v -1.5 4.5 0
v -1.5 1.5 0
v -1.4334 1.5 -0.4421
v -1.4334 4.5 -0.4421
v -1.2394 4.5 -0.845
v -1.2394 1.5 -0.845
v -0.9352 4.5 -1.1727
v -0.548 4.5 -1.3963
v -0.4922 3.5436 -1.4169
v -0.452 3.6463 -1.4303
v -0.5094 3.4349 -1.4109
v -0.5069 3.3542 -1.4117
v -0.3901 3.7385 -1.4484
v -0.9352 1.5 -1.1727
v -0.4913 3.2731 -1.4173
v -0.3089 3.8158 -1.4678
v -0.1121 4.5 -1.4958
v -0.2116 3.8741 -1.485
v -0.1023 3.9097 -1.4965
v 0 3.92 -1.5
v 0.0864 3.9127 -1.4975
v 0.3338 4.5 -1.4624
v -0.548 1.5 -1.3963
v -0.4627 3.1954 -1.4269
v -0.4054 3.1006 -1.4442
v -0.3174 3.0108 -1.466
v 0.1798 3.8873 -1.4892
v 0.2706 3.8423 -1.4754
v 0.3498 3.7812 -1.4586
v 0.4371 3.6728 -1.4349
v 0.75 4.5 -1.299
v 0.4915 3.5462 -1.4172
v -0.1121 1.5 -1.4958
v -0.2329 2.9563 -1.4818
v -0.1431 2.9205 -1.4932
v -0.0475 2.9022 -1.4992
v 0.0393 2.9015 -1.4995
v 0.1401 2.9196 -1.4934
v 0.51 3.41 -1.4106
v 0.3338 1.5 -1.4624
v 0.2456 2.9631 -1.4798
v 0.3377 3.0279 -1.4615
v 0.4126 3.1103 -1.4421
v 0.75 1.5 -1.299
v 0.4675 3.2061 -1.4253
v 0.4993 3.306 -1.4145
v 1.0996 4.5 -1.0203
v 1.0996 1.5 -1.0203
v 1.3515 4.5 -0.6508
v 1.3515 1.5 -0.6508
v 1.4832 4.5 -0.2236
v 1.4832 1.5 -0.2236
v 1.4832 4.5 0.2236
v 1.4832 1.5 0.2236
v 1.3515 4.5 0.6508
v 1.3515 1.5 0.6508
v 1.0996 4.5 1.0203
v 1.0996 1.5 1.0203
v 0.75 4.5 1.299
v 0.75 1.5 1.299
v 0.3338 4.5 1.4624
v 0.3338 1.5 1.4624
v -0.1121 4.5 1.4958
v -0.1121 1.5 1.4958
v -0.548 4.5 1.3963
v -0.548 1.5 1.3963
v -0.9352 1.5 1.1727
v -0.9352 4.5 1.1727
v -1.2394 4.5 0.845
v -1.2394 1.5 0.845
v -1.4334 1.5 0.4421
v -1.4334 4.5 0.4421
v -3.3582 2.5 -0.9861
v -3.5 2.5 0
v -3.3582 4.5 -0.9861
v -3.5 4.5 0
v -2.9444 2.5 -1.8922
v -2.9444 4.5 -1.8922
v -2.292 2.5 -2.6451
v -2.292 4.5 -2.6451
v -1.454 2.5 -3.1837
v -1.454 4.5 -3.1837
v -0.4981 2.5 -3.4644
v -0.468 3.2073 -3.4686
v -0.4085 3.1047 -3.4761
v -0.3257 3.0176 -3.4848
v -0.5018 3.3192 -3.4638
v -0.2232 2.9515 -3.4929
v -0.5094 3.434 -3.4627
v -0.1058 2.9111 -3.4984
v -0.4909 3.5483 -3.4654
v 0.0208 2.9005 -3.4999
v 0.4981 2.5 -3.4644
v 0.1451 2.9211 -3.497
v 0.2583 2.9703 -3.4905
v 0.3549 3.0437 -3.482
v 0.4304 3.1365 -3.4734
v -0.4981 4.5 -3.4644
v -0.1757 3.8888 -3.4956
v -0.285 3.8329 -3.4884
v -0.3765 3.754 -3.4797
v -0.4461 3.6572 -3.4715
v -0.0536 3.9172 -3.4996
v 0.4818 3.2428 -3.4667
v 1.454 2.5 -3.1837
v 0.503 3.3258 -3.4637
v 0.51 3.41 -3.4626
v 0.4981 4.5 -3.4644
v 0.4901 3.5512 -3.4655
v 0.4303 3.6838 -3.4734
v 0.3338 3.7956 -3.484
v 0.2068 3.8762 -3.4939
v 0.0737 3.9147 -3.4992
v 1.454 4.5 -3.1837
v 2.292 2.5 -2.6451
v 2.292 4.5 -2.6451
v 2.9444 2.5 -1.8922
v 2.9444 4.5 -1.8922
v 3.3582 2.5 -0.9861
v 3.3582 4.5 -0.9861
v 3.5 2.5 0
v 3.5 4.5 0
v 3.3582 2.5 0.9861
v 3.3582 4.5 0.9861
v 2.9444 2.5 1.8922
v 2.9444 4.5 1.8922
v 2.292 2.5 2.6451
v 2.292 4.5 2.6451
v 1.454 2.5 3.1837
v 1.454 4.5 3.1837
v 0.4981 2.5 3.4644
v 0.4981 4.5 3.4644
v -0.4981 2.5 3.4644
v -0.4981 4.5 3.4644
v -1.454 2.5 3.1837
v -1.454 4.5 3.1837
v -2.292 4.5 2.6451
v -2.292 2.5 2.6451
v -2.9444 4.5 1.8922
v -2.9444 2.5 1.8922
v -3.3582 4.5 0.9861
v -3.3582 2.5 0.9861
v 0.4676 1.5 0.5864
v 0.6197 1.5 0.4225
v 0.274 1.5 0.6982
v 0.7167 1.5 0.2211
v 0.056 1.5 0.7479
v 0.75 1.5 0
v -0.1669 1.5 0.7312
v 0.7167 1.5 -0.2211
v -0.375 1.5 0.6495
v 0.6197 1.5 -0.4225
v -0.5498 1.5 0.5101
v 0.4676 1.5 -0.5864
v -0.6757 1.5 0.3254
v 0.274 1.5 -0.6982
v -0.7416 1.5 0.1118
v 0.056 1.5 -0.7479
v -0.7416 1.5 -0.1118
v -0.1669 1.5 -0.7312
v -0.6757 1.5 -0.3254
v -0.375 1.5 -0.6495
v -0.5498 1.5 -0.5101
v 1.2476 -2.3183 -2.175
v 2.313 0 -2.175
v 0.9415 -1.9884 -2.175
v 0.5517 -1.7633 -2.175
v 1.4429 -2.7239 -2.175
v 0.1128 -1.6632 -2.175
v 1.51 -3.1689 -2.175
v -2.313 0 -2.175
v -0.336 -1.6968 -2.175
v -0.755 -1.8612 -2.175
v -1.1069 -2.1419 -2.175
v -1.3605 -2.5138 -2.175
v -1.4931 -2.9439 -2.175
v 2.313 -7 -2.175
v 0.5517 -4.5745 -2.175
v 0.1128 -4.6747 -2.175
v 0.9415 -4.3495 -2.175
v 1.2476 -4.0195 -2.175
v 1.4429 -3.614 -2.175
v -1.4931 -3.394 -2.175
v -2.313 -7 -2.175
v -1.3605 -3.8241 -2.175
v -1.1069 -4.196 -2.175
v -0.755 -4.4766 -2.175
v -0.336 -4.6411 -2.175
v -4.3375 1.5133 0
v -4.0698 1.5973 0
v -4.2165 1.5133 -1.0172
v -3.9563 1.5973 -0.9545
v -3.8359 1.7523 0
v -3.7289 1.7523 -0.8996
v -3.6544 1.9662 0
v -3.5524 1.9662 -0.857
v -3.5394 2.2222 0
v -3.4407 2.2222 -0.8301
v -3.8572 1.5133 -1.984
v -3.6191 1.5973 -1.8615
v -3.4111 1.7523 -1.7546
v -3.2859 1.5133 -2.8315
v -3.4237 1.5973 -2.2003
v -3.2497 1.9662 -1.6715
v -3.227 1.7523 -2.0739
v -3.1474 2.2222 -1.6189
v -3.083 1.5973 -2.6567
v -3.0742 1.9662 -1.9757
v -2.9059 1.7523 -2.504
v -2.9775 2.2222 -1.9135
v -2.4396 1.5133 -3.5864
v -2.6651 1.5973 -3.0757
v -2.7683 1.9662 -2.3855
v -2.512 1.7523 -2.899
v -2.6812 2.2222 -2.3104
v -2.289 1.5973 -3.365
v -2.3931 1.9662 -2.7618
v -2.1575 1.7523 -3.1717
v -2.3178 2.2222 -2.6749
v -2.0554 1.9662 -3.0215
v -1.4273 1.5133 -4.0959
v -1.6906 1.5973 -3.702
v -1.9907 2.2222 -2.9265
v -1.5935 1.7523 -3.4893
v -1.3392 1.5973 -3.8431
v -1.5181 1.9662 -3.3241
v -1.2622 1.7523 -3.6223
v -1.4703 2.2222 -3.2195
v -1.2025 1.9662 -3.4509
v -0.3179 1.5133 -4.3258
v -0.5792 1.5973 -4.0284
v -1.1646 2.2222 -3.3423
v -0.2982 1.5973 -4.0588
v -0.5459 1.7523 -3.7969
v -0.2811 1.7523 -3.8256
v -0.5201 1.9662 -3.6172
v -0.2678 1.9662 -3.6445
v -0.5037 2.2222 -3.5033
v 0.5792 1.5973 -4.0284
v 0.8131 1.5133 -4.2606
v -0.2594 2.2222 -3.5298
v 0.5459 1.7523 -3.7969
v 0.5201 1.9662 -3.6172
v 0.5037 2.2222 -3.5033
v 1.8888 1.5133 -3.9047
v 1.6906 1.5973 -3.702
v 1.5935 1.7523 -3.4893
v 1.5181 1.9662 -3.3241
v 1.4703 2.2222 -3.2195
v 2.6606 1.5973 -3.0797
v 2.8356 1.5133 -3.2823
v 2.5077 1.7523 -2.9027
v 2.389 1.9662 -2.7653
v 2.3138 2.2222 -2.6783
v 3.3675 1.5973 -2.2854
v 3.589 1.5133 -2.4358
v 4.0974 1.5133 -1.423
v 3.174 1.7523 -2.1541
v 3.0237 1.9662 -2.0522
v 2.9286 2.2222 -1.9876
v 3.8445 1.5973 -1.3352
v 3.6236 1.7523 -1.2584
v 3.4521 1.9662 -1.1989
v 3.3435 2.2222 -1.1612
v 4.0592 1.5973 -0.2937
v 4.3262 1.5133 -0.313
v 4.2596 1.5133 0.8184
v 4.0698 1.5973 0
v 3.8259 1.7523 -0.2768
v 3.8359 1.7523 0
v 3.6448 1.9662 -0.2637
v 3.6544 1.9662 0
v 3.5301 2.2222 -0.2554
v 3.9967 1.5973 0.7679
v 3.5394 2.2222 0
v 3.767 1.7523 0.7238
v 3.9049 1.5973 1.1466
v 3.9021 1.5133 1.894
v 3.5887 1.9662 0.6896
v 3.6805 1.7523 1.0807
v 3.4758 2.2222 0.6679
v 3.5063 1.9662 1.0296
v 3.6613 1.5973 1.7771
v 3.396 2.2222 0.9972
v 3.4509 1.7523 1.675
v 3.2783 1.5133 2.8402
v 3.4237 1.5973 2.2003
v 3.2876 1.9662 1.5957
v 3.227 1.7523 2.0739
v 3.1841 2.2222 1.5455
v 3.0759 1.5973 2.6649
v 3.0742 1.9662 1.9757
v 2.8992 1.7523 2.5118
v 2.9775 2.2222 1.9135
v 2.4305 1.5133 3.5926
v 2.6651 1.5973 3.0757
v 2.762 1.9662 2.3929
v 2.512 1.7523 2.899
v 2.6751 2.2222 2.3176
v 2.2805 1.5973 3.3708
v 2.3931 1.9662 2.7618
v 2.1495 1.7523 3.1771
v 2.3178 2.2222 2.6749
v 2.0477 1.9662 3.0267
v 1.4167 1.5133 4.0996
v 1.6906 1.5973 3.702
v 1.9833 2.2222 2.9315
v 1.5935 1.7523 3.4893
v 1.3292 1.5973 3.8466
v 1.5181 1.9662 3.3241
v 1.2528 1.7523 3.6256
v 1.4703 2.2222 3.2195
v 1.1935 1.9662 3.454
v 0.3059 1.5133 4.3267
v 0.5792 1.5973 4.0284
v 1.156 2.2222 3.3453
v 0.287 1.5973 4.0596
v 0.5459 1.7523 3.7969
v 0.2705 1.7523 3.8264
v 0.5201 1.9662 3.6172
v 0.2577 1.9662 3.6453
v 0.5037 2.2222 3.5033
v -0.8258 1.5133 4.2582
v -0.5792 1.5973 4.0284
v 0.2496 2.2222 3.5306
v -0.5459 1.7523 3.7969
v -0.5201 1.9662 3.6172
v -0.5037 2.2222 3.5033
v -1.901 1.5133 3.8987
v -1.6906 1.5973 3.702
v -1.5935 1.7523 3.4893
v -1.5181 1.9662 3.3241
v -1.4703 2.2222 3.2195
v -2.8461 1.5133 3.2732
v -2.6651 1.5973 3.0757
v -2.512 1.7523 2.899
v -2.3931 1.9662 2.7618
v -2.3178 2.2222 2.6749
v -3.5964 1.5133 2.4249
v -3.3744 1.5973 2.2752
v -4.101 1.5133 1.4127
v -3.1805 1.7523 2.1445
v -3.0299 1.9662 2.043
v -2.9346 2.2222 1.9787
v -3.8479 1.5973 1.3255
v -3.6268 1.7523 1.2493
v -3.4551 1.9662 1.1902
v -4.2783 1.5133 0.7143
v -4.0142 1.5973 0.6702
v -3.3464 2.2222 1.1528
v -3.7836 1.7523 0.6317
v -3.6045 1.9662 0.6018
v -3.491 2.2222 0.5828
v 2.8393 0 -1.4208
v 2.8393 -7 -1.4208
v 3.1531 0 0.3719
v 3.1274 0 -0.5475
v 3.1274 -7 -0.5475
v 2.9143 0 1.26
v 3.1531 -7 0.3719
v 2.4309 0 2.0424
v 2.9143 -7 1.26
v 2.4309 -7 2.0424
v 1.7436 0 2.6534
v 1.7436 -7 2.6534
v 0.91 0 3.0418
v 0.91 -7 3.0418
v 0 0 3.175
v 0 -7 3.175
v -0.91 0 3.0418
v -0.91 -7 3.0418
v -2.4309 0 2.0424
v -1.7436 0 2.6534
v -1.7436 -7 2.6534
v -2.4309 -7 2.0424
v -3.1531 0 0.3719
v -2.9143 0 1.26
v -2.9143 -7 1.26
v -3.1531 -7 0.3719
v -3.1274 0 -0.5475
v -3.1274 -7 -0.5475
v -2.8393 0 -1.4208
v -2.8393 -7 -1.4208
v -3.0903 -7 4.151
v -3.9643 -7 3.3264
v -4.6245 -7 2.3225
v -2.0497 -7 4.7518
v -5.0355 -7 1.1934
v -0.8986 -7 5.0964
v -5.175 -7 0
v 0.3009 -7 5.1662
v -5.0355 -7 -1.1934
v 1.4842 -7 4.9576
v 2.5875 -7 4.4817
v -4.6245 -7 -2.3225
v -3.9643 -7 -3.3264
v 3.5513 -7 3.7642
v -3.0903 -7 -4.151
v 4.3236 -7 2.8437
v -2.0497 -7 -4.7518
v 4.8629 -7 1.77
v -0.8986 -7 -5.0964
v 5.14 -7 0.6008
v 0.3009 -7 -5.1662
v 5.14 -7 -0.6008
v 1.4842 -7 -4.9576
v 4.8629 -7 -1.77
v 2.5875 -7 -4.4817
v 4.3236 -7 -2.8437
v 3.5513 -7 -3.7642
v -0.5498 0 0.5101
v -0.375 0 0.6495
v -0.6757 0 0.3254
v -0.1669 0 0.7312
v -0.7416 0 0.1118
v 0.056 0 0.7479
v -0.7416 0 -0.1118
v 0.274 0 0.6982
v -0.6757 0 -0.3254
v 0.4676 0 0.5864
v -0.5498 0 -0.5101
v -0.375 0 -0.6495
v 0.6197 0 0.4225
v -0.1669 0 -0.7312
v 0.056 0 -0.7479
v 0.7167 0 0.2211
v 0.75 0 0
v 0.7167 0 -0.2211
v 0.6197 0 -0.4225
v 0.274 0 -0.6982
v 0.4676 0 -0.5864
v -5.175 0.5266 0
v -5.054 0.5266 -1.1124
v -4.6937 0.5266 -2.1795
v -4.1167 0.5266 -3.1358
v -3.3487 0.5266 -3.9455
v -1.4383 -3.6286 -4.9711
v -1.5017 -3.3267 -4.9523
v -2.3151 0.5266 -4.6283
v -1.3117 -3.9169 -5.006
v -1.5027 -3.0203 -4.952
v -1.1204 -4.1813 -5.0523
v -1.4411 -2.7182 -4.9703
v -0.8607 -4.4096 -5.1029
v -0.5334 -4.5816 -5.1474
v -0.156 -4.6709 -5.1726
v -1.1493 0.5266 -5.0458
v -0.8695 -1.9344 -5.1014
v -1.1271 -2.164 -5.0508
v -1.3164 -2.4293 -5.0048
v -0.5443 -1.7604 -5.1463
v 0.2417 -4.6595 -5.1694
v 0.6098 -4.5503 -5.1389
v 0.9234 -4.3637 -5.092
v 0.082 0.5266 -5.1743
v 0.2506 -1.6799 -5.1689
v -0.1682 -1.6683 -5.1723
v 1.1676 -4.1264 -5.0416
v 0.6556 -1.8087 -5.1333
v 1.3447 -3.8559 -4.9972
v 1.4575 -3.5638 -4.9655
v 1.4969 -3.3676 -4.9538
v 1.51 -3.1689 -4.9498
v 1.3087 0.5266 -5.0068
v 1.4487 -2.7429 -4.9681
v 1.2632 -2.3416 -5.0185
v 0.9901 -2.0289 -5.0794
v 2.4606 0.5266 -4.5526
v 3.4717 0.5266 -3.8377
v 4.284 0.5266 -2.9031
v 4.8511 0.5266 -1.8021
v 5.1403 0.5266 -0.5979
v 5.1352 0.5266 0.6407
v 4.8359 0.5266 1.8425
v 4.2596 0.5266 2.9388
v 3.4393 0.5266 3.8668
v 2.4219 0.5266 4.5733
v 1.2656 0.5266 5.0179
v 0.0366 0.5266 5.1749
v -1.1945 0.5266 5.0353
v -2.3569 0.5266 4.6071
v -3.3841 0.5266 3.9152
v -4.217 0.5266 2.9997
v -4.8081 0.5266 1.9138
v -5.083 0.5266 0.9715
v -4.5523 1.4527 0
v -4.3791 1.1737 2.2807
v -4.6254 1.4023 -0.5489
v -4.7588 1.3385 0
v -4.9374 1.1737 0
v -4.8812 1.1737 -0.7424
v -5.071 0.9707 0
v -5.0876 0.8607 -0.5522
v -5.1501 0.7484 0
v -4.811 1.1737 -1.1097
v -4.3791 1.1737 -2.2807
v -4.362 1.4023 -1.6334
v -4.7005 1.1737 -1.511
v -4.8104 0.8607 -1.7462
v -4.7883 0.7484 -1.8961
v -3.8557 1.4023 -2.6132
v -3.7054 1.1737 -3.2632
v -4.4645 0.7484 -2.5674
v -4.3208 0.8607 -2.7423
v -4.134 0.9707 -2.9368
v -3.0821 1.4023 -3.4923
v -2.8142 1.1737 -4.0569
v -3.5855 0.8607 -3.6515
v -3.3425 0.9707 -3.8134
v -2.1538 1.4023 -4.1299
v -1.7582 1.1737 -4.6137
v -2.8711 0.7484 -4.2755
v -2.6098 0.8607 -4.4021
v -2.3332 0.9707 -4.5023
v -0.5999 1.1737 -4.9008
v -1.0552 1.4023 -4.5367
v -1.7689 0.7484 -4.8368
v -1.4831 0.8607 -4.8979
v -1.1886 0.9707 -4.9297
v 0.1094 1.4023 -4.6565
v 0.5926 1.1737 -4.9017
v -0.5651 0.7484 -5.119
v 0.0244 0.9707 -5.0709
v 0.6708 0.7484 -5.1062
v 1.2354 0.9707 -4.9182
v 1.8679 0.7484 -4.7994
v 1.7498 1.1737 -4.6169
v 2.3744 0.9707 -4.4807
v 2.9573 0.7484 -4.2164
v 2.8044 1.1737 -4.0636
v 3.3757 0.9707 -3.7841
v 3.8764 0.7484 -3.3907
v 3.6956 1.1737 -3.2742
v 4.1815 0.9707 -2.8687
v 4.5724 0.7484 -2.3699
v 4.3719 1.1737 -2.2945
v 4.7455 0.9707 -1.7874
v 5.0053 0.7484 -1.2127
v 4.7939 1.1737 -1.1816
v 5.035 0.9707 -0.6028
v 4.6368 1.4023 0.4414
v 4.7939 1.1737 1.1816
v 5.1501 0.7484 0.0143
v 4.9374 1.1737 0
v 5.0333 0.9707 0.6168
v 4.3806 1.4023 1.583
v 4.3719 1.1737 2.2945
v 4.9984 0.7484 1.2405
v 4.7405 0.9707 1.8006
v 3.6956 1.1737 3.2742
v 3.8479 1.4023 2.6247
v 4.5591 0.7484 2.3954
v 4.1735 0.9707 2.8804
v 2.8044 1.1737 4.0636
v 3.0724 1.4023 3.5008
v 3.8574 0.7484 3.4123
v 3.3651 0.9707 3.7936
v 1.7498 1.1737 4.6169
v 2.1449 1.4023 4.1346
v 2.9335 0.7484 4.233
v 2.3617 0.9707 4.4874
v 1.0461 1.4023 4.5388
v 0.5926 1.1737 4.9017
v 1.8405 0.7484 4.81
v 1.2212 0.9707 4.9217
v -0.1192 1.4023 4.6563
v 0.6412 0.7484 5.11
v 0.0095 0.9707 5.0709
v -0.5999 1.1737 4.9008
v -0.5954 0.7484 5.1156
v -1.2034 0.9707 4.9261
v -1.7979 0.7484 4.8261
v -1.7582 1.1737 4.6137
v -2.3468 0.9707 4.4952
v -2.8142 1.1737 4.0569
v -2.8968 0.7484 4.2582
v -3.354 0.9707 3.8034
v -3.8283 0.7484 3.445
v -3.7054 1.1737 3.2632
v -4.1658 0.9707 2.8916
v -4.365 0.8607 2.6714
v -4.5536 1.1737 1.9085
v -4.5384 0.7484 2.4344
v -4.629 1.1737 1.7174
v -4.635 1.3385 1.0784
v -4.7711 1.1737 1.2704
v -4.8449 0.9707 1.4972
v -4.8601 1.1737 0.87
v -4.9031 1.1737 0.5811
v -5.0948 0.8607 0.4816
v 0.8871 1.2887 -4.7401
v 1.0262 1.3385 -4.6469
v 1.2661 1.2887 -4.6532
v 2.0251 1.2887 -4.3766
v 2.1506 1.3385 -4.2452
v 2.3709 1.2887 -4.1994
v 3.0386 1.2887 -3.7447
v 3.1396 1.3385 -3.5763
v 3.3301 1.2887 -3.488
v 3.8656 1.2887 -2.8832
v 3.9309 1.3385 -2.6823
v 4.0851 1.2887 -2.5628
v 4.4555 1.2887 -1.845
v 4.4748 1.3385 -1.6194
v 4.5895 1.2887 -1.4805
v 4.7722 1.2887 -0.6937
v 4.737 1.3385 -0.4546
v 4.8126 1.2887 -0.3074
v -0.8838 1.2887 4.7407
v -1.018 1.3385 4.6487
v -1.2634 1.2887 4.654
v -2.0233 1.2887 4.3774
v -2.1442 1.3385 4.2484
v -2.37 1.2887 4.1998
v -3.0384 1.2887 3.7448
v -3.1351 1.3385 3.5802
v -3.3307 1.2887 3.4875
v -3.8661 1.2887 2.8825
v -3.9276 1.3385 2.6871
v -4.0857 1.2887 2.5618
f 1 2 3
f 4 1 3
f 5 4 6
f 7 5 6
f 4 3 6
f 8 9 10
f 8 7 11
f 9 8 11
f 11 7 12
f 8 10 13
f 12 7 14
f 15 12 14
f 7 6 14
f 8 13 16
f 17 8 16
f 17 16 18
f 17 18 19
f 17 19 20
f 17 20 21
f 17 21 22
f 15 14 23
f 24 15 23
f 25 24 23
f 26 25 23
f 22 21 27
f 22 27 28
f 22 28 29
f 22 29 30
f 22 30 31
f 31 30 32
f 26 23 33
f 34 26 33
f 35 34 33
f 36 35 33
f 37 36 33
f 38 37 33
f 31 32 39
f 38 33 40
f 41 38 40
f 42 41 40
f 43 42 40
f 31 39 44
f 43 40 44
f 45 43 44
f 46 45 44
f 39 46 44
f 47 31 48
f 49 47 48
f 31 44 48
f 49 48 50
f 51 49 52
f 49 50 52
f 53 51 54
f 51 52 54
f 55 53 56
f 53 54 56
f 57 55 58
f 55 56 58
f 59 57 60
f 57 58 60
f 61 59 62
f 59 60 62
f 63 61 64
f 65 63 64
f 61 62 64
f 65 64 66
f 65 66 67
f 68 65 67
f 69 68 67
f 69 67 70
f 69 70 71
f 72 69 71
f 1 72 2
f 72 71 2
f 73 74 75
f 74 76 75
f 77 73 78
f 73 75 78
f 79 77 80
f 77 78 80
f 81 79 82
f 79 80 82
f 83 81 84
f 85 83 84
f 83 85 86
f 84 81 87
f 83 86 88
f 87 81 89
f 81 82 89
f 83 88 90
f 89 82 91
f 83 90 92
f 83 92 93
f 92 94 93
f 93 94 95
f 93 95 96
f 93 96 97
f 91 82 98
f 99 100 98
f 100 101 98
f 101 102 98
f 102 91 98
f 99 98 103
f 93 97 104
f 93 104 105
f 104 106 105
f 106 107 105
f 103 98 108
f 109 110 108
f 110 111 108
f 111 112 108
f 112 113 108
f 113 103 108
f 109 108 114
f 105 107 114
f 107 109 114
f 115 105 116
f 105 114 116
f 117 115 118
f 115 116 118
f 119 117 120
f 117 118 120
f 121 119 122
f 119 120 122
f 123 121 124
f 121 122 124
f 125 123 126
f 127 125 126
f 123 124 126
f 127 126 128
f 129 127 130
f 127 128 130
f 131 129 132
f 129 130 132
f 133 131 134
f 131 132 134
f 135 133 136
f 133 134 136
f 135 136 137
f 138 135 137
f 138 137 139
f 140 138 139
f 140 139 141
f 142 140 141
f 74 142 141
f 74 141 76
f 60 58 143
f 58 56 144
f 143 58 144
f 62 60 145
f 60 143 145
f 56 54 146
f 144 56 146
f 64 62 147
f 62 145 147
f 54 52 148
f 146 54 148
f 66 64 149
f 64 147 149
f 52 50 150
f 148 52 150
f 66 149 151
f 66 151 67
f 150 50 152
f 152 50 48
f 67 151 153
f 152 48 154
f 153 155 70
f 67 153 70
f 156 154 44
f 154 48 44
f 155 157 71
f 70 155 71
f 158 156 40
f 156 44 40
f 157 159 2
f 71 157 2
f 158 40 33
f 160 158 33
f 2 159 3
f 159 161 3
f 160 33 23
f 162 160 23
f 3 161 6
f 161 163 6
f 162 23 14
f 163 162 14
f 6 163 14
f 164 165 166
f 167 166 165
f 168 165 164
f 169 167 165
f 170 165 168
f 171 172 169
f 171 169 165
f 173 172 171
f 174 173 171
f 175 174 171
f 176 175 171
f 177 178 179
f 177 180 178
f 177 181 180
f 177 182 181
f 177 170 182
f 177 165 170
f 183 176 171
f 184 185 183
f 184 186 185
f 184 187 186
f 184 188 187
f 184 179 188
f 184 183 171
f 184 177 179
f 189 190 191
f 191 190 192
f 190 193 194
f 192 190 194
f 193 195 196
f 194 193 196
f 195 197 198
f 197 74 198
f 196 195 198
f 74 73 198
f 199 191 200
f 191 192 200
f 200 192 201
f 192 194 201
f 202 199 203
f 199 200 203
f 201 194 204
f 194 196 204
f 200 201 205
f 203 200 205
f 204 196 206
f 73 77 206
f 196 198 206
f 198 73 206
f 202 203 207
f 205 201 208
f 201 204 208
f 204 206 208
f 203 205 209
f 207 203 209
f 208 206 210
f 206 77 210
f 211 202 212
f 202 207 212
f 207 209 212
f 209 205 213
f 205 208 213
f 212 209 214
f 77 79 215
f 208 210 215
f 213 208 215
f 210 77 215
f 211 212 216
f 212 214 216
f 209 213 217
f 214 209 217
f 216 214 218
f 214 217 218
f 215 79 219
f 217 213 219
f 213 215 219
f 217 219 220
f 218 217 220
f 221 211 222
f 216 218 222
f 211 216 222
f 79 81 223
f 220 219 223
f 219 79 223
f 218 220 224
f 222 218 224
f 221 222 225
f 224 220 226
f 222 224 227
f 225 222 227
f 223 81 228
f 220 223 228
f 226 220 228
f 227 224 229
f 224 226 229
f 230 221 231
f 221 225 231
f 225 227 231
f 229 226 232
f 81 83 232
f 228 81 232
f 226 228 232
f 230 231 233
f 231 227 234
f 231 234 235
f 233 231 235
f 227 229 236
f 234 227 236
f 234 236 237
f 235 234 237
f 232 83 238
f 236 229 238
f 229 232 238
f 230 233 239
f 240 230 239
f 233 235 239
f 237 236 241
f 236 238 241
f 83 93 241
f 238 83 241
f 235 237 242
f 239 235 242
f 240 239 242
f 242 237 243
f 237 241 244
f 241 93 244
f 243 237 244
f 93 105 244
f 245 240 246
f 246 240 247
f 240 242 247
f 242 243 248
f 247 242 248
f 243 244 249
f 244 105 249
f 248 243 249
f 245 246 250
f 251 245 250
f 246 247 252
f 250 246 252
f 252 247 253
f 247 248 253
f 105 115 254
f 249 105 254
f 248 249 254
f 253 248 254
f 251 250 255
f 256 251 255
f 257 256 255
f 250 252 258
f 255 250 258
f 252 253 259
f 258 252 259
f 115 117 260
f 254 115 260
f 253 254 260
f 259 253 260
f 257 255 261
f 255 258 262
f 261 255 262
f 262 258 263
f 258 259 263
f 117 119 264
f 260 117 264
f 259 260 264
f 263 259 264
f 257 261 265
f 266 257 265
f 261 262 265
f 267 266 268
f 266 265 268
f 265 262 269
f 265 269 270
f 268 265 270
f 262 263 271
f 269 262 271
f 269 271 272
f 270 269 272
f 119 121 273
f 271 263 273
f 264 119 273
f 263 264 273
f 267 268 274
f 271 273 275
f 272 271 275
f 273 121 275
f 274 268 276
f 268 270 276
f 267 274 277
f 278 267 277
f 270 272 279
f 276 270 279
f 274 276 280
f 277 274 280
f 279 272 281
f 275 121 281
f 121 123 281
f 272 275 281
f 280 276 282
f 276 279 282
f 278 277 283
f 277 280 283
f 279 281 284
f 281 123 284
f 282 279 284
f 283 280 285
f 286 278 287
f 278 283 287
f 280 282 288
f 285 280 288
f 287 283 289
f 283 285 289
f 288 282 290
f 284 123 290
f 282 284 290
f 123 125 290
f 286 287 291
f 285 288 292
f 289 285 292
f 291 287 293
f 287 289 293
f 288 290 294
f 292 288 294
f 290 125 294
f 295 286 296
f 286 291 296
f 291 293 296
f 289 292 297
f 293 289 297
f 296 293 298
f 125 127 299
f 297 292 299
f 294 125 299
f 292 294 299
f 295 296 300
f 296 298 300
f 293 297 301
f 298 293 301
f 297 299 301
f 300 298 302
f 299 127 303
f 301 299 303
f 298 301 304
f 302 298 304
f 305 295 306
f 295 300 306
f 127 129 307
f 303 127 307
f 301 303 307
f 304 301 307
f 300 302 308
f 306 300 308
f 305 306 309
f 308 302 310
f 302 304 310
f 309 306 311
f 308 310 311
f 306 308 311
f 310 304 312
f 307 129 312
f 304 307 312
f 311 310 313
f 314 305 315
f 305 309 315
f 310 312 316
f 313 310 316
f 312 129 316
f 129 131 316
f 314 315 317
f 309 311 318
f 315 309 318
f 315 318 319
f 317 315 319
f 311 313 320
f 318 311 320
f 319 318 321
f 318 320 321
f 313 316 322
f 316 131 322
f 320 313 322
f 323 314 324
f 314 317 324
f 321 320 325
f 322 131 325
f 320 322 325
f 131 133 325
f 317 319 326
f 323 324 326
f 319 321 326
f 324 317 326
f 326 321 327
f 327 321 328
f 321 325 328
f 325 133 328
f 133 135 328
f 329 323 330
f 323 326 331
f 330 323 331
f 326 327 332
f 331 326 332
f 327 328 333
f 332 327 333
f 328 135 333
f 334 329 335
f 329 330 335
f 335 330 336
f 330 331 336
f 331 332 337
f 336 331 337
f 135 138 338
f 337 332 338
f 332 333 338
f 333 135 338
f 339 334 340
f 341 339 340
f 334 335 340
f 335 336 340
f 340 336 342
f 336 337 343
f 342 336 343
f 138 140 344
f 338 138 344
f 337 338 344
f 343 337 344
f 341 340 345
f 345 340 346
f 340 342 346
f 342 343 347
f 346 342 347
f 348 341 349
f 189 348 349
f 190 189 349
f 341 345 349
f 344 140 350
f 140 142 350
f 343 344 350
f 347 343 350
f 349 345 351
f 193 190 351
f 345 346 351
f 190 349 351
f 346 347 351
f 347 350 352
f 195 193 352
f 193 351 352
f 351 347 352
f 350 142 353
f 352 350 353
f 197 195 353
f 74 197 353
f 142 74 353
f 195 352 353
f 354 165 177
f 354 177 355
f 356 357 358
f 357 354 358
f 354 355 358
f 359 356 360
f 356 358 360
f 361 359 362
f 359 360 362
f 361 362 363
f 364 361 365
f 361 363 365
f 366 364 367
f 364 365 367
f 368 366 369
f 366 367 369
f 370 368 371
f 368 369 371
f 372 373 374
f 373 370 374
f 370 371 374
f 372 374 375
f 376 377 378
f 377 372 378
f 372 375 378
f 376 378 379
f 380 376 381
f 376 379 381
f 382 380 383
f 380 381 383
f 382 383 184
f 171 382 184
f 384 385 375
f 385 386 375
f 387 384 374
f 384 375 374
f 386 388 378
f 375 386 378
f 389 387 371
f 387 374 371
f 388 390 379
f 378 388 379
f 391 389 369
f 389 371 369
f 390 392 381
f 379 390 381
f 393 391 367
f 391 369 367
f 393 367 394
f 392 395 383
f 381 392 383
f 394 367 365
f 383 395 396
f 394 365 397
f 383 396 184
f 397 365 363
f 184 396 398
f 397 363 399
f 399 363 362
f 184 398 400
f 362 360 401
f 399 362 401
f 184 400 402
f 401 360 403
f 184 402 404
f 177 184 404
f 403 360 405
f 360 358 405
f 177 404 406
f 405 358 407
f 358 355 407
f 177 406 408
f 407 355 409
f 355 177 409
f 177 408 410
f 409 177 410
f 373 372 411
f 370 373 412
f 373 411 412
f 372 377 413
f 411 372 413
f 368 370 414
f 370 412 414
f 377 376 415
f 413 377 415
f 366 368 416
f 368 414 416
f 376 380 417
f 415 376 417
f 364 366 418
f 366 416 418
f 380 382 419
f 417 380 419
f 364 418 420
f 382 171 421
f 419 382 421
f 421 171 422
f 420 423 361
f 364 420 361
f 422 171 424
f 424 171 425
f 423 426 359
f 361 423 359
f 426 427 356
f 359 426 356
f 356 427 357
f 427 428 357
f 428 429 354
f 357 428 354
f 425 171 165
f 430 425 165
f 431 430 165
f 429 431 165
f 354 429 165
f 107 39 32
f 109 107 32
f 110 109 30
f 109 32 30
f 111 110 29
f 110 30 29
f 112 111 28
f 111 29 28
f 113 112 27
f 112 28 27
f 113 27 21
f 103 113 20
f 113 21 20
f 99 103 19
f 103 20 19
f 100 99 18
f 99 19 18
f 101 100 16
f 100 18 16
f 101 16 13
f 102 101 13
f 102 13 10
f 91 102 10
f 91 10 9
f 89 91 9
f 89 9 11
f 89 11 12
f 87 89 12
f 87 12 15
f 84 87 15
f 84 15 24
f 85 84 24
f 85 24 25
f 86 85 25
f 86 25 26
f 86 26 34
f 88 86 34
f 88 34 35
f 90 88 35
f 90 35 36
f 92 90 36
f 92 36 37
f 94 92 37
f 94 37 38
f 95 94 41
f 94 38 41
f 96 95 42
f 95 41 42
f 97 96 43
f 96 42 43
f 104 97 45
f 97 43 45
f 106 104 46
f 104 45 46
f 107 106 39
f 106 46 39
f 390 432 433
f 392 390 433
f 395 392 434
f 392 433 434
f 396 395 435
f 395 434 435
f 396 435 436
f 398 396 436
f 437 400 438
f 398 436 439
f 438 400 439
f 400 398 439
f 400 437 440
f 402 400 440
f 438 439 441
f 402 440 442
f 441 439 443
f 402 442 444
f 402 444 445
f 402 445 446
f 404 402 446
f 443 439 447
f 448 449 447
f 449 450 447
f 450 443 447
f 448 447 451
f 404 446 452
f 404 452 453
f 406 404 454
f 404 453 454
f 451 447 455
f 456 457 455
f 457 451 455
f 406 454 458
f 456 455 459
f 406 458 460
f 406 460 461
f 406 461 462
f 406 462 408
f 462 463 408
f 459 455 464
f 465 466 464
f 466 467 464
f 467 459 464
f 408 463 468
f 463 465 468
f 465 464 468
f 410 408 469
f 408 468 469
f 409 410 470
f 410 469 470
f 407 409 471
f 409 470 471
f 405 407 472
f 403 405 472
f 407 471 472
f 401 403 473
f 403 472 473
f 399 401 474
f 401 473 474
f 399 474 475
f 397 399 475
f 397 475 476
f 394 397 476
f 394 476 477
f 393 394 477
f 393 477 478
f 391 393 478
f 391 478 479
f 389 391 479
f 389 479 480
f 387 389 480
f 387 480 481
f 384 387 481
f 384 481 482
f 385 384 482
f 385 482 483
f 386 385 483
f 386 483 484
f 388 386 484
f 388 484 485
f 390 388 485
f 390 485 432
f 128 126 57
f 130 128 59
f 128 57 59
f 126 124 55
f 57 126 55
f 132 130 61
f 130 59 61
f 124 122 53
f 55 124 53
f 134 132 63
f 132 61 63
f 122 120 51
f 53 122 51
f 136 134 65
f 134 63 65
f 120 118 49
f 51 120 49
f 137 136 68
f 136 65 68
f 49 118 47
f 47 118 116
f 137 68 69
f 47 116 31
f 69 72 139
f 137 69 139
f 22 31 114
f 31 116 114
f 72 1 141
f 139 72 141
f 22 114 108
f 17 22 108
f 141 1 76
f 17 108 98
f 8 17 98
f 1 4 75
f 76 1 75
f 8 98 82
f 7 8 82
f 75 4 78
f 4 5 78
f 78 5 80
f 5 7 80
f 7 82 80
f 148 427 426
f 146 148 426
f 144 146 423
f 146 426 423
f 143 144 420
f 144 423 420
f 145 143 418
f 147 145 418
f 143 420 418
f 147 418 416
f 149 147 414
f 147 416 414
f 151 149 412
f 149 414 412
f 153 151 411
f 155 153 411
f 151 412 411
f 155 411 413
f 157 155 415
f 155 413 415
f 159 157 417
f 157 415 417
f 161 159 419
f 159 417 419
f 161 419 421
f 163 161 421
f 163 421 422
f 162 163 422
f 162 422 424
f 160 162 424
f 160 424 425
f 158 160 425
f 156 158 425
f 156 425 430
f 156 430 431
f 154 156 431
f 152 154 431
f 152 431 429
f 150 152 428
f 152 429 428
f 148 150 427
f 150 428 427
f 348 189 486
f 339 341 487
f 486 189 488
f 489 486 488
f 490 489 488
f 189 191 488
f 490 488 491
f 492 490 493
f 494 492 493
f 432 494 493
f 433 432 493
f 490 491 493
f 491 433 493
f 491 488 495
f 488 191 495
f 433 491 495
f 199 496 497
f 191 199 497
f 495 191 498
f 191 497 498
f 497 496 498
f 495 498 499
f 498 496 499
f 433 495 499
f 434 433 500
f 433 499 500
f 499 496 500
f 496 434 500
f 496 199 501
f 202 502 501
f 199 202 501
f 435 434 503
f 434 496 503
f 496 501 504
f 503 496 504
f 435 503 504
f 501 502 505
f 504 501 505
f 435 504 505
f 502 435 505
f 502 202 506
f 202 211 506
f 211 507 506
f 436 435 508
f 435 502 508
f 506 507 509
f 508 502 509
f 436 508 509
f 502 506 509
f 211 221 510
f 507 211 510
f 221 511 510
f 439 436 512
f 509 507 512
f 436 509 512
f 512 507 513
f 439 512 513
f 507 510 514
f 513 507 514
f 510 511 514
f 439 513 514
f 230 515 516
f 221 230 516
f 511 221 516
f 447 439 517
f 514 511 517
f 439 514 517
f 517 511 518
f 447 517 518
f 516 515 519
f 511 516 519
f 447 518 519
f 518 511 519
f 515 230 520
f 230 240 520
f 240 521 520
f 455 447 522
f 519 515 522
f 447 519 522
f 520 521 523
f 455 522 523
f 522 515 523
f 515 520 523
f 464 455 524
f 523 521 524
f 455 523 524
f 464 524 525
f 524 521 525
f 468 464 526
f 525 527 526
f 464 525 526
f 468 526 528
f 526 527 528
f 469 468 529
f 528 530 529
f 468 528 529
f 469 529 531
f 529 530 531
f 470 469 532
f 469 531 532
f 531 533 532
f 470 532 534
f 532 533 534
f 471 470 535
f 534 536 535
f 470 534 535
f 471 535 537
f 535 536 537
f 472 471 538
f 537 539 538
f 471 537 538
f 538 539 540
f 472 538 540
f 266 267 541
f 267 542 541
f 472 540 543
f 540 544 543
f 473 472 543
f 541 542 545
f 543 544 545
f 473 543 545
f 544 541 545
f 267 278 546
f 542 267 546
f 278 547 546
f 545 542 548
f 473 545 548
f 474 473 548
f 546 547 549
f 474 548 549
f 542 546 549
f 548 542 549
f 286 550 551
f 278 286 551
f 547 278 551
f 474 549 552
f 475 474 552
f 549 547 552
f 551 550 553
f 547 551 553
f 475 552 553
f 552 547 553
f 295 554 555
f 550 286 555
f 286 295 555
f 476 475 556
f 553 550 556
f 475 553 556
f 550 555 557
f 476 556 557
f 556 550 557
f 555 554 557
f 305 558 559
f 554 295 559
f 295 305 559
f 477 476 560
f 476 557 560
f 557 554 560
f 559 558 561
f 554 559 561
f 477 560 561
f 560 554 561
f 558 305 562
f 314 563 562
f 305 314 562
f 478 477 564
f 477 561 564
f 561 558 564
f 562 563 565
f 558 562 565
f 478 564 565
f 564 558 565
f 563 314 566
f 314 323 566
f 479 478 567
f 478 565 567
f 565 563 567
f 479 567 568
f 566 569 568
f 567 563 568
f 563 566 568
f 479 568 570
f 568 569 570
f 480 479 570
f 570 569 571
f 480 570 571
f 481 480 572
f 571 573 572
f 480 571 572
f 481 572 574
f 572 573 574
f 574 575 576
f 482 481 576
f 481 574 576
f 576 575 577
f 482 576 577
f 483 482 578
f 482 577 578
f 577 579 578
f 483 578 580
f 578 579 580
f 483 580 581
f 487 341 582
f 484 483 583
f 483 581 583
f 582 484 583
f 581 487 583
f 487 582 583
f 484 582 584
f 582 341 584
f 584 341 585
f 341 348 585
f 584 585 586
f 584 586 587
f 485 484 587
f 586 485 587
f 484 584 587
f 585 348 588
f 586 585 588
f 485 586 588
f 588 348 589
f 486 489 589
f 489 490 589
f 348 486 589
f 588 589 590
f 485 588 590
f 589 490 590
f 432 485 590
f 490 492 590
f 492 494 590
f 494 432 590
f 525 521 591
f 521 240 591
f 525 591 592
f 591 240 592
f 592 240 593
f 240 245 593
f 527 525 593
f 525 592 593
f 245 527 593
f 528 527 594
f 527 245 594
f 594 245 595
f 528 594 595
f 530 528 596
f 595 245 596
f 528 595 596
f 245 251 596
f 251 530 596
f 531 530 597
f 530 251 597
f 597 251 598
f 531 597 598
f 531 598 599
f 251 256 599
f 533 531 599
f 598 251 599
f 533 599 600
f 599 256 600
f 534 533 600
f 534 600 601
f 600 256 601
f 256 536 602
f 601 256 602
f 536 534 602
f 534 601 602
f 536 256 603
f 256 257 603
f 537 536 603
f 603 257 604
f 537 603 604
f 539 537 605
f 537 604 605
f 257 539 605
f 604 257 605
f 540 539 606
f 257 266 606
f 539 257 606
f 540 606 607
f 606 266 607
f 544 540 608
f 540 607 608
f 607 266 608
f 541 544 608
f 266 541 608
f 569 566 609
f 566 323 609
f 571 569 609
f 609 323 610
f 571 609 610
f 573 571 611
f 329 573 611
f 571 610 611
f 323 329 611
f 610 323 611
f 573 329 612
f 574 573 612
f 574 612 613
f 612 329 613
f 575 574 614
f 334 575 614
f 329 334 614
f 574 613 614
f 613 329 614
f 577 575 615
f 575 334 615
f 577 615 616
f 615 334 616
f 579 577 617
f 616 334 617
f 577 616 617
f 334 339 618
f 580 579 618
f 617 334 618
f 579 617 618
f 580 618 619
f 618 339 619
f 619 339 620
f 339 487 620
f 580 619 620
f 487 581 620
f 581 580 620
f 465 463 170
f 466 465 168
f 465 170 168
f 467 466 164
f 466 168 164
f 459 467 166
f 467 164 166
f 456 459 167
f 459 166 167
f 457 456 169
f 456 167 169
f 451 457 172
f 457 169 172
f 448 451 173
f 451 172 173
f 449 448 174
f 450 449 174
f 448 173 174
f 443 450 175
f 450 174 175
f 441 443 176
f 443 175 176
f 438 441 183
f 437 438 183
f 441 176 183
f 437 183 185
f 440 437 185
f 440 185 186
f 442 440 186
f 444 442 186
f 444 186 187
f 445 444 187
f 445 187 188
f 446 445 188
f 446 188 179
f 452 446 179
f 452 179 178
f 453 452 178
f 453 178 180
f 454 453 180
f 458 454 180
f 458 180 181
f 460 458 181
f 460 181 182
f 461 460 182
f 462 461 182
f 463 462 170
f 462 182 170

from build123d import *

# Parameters (mm, degrees)
FILLET1_R               = 1
FILLET2_R               = 1
BOSS_EXTRUDE1_DEPTH     = 7
CUT_EXTRUDE1_REACH      = 12.127
CUT_EXTRUDE1_END_RADIUS = 5.175
SKETCH2_R               = 1.51
SKETCH2_R_2             = 0.51
SKETCH4_R               = 0.75
CUT_EXTRUDE2_DEPTH      = 1.5


with BuildPart() as part:
    # Sketch1 → Revolve1 (revolve)
    with BuildSketch(Plane.XY, mode=Mode.PRIVATE) as revolve1_sk:
        Polygon((0, 0), (3.175, 0), (3.175, -7), (5.175, -7), (5.175, -4.640909091), (5.175, 1.5), (3.5, 1.5), (3.5, 4.5), (1.5, 4.5), (1.5, 1.5), (0, 1.5), align=None)
    revolve(revolve1_sk.sketch.rotate(Axis((0, 1.5, 0), (0, -1, 0)), 180), axis=Axis((0, 1.5, 0), (0, -1, 0)))

    # Fillet1
    fillet1_edges = [part.edges().sort_by_distance(p)[0] for p in [
        (3.5, 1.5, 0),
    ]]
    fillet(fillet1_edges, radius=FILLET1_R)

    # Fillet2
    fillet2_edges = [part.edges().sort_by_distance(p)[0] for p in [
        (5.175, 1.5, 0),
    ]]
    fillet(fillet2_edges, radius=FILLET2_R)

    # Sketch3 → Boss-Extrude1 (add)
    with BuildSketch(Plane.XZ.offset(7)):
        with BuildLine():
            Line((2.313006701, -2.175), (-2.313006701, -2.175))
            ThreePointArc((-2.313006701, -2.175), (0, -3.175), (2.313006701, -2.175))
        make_face()
    extrude(amount=-BOSS_EXTRUDE1_DEPTH)

    # Cut-Extrude1: up to this cylinder (the profile starts inside it)
    cut_extrude1_end = Plane(origin=(0, 0.120549, 0), z_dir=(0, 1, 0)) * Cylinder(CUT_EXTRUDE1_END_RADIUS, 42.18296, mode=Mode.PRIVATE)
    # Sketch2 → Cut-Extrude1 (cut, up to the surface)
    with BuildSketch(Plane.XY, mode=Mode.PRIVATE) as cut_extrude1_sk1:
        with Locations((0, -3.168930556)):
            Circle(SKETCH2_R)
    cut_extrude1_tool1 = extrude(cut_extrude1_sk1.sketch, amount=-CUT_EXTRUDE1_REACH, mode=Mode.PRIVATE) & cut_extrude1_end
    add(cut_extrude1_tool1.solids().sort_by_distance((0, -3.168931, 0))[0], mode=Mode.SUBTRACT)
    # Sketch2 → Cut-Extrude1 (cut, up to the surface)
    with BuildSketch(Plane.XY, mode=Mode.PRIVATE) as cut_extrude1_sk2:
        with Locations((0, 3.410029171)):
            Circle(SKETCH2_R_2)
    cut_extrude1_tool2 = extrude(cut_extrude1_sk2.sketch, amount=-CUT_EXTRUDE1_REACH, mode=Mode.PRIVATE) & cut_extrude1_end
    add(cut_extrude1_tool2.solids().sort_by_distance((0, 3.410029, 0))[0], mode=Mode.SUBTRACT)

    # Sketch4 → Cut-Extrude2 (cut)
    with BuildSketch(Plane.XZ):
        Circle(SKETCH4_R)
    extrude(amount=-CUT_EXTRUDE2_DEPTH, mode=Mode.SUBTRACT)


solid = part.part
